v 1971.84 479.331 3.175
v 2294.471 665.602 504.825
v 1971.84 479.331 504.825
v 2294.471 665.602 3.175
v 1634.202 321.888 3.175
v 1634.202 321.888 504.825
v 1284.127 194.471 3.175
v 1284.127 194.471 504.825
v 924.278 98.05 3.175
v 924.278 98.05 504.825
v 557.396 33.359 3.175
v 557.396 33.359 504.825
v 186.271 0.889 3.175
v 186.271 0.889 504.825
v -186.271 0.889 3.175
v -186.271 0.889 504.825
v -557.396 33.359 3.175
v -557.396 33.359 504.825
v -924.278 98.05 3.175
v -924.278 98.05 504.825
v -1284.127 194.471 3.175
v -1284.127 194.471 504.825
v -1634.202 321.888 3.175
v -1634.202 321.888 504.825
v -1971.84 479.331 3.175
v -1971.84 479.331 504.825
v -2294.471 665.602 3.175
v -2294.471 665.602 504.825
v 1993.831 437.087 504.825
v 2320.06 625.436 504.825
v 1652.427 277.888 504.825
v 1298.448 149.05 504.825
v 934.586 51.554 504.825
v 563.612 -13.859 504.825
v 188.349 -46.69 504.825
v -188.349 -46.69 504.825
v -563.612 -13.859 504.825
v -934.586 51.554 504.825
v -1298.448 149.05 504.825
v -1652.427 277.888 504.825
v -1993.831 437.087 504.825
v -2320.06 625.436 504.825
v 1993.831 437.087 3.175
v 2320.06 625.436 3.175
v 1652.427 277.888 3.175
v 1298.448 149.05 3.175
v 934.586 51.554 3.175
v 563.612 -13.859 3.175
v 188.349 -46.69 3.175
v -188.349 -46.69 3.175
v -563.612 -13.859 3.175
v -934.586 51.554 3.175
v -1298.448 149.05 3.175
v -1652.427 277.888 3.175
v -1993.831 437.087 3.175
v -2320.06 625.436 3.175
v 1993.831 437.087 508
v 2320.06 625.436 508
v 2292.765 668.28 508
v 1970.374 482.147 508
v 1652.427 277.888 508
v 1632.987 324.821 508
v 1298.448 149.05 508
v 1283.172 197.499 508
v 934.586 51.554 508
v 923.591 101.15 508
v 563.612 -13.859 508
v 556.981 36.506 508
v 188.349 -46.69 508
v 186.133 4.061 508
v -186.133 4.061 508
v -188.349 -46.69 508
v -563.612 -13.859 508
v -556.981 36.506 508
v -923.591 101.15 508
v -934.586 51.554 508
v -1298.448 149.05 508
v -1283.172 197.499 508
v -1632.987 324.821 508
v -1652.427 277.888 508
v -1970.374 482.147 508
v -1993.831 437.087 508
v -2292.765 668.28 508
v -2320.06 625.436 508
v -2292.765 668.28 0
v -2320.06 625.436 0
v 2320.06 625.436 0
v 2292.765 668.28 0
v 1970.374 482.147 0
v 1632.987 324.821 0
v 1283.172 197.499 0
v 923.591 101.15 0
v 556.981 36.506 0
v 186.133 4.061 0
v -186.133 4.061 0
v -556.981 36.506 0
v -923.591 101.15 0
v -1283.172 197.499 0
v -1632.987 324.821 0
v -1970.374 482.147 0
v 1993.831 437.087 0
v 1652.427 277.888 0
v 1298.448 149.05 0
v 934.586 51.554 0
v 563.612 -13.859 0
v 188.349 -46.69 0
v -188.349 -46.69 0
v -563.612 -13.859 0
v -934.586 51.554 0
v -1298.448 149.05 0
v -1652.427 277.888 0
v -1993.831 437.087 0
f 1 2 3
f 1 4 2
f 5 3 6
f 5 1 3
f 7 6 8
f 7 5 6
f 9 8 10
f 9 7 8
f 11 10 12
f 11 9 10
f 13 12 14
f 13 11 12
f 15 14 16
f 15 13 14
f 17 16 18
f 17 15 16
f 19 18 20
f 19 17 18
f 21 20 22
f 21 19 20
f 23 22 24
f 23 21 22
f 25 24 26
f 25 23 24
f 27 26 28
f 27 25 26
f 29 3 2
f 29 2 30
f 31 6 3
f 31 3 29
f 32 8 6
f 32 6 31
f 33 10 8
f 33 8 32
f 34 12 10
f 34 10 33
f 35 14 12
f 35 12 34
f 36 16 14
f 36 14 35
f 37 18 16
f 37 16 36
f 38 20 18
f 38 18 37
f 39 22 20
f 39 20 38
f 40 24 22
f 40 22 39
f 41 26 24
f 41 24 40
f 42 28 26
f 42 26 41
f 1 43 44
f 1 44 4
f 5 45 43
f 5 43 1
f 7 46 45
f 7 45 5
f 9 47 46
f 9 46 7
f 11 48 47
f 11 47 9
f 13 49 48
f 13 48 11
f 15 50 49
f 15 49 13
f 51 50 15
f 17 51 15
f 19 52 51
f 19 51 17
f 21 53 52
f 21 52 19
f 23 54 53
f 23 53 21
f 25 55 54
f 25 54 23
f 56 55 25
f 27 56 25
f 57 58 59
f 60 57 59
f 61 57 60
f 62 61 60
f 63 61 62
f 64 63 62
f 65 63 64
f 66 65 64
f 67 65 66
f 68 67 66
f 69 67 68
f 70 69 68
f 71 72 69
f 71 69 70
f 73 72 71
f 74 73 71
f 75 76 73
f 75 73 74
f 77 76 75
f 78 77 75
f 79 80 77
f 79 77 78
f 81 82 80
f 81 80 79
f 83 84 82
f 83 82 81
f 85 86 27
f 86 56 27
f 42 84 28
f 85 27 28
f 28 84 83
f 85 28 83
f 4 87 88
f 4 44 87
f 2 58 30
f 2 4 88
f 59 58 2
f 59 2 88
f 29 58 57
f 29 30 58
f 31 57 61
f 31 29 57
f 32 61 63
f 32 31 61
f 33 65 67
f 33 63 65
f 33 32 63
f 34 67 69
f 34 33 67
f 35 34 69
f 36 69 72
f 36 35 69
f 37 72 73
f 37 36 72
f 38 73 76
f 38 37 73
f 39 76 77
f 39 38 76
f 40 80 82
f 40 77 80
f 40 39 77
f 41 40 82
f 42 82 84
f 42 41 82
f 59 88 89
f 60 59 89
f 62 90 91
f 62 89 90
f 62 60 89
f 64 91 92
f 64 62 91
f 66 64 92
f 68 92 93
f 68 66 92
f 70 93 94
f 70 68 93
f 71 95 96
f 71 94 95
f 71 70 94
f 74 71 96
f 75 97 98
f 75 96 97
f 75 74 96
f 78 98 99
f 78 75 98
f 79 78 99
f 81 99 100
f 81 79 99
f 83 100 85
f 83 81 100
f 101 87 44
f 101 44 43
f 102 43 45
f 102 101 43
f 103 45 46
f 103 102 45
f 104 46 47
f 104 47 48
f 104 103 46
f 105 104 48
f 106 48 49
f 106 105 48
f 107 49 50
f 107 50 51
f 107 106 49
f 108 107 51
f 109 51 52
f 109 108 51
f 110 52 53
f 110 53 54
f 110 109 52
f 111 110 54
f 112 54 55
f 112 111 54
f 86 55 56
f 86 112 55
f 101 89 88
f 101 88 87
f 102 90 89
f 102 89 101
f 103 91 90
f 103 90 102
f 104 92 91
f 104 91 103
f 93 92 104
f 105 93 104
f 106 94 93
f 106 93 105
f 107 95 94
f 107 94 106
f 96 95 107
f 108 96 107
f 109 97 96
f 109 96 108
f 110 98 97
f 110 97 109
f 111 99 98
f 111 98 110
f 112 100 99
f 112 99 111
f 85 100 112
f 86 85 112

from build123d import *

# Parameters (mm, degrees)
F2_ANGLE = 65


with BuildPart() as f2:
    # F0 (on Right) → F2 (revolve, symmetric)
    with BuildSketch(Plane.YZ) as f2_sk:
        Polygon((-50.8, 0), (0, 0), (0, 508), (-50.8, 508), (-50.8, 504.825), (-3.175, 504.825), (-3.175, 3.175), (-50.8, 3.175), align=None)
    revolve(axis=Axis((0, 4267.2, 5661.746735), (0, 0, 1)), revolution_arc=F2_ANGLE / 2)
    revolve(f2_sk.sketch, axis=Axis((0, 4267.2, 5661.746735), (0, 0, -1)), revolution_arc=F2_ANGLE / 2)


solid = f2.part
